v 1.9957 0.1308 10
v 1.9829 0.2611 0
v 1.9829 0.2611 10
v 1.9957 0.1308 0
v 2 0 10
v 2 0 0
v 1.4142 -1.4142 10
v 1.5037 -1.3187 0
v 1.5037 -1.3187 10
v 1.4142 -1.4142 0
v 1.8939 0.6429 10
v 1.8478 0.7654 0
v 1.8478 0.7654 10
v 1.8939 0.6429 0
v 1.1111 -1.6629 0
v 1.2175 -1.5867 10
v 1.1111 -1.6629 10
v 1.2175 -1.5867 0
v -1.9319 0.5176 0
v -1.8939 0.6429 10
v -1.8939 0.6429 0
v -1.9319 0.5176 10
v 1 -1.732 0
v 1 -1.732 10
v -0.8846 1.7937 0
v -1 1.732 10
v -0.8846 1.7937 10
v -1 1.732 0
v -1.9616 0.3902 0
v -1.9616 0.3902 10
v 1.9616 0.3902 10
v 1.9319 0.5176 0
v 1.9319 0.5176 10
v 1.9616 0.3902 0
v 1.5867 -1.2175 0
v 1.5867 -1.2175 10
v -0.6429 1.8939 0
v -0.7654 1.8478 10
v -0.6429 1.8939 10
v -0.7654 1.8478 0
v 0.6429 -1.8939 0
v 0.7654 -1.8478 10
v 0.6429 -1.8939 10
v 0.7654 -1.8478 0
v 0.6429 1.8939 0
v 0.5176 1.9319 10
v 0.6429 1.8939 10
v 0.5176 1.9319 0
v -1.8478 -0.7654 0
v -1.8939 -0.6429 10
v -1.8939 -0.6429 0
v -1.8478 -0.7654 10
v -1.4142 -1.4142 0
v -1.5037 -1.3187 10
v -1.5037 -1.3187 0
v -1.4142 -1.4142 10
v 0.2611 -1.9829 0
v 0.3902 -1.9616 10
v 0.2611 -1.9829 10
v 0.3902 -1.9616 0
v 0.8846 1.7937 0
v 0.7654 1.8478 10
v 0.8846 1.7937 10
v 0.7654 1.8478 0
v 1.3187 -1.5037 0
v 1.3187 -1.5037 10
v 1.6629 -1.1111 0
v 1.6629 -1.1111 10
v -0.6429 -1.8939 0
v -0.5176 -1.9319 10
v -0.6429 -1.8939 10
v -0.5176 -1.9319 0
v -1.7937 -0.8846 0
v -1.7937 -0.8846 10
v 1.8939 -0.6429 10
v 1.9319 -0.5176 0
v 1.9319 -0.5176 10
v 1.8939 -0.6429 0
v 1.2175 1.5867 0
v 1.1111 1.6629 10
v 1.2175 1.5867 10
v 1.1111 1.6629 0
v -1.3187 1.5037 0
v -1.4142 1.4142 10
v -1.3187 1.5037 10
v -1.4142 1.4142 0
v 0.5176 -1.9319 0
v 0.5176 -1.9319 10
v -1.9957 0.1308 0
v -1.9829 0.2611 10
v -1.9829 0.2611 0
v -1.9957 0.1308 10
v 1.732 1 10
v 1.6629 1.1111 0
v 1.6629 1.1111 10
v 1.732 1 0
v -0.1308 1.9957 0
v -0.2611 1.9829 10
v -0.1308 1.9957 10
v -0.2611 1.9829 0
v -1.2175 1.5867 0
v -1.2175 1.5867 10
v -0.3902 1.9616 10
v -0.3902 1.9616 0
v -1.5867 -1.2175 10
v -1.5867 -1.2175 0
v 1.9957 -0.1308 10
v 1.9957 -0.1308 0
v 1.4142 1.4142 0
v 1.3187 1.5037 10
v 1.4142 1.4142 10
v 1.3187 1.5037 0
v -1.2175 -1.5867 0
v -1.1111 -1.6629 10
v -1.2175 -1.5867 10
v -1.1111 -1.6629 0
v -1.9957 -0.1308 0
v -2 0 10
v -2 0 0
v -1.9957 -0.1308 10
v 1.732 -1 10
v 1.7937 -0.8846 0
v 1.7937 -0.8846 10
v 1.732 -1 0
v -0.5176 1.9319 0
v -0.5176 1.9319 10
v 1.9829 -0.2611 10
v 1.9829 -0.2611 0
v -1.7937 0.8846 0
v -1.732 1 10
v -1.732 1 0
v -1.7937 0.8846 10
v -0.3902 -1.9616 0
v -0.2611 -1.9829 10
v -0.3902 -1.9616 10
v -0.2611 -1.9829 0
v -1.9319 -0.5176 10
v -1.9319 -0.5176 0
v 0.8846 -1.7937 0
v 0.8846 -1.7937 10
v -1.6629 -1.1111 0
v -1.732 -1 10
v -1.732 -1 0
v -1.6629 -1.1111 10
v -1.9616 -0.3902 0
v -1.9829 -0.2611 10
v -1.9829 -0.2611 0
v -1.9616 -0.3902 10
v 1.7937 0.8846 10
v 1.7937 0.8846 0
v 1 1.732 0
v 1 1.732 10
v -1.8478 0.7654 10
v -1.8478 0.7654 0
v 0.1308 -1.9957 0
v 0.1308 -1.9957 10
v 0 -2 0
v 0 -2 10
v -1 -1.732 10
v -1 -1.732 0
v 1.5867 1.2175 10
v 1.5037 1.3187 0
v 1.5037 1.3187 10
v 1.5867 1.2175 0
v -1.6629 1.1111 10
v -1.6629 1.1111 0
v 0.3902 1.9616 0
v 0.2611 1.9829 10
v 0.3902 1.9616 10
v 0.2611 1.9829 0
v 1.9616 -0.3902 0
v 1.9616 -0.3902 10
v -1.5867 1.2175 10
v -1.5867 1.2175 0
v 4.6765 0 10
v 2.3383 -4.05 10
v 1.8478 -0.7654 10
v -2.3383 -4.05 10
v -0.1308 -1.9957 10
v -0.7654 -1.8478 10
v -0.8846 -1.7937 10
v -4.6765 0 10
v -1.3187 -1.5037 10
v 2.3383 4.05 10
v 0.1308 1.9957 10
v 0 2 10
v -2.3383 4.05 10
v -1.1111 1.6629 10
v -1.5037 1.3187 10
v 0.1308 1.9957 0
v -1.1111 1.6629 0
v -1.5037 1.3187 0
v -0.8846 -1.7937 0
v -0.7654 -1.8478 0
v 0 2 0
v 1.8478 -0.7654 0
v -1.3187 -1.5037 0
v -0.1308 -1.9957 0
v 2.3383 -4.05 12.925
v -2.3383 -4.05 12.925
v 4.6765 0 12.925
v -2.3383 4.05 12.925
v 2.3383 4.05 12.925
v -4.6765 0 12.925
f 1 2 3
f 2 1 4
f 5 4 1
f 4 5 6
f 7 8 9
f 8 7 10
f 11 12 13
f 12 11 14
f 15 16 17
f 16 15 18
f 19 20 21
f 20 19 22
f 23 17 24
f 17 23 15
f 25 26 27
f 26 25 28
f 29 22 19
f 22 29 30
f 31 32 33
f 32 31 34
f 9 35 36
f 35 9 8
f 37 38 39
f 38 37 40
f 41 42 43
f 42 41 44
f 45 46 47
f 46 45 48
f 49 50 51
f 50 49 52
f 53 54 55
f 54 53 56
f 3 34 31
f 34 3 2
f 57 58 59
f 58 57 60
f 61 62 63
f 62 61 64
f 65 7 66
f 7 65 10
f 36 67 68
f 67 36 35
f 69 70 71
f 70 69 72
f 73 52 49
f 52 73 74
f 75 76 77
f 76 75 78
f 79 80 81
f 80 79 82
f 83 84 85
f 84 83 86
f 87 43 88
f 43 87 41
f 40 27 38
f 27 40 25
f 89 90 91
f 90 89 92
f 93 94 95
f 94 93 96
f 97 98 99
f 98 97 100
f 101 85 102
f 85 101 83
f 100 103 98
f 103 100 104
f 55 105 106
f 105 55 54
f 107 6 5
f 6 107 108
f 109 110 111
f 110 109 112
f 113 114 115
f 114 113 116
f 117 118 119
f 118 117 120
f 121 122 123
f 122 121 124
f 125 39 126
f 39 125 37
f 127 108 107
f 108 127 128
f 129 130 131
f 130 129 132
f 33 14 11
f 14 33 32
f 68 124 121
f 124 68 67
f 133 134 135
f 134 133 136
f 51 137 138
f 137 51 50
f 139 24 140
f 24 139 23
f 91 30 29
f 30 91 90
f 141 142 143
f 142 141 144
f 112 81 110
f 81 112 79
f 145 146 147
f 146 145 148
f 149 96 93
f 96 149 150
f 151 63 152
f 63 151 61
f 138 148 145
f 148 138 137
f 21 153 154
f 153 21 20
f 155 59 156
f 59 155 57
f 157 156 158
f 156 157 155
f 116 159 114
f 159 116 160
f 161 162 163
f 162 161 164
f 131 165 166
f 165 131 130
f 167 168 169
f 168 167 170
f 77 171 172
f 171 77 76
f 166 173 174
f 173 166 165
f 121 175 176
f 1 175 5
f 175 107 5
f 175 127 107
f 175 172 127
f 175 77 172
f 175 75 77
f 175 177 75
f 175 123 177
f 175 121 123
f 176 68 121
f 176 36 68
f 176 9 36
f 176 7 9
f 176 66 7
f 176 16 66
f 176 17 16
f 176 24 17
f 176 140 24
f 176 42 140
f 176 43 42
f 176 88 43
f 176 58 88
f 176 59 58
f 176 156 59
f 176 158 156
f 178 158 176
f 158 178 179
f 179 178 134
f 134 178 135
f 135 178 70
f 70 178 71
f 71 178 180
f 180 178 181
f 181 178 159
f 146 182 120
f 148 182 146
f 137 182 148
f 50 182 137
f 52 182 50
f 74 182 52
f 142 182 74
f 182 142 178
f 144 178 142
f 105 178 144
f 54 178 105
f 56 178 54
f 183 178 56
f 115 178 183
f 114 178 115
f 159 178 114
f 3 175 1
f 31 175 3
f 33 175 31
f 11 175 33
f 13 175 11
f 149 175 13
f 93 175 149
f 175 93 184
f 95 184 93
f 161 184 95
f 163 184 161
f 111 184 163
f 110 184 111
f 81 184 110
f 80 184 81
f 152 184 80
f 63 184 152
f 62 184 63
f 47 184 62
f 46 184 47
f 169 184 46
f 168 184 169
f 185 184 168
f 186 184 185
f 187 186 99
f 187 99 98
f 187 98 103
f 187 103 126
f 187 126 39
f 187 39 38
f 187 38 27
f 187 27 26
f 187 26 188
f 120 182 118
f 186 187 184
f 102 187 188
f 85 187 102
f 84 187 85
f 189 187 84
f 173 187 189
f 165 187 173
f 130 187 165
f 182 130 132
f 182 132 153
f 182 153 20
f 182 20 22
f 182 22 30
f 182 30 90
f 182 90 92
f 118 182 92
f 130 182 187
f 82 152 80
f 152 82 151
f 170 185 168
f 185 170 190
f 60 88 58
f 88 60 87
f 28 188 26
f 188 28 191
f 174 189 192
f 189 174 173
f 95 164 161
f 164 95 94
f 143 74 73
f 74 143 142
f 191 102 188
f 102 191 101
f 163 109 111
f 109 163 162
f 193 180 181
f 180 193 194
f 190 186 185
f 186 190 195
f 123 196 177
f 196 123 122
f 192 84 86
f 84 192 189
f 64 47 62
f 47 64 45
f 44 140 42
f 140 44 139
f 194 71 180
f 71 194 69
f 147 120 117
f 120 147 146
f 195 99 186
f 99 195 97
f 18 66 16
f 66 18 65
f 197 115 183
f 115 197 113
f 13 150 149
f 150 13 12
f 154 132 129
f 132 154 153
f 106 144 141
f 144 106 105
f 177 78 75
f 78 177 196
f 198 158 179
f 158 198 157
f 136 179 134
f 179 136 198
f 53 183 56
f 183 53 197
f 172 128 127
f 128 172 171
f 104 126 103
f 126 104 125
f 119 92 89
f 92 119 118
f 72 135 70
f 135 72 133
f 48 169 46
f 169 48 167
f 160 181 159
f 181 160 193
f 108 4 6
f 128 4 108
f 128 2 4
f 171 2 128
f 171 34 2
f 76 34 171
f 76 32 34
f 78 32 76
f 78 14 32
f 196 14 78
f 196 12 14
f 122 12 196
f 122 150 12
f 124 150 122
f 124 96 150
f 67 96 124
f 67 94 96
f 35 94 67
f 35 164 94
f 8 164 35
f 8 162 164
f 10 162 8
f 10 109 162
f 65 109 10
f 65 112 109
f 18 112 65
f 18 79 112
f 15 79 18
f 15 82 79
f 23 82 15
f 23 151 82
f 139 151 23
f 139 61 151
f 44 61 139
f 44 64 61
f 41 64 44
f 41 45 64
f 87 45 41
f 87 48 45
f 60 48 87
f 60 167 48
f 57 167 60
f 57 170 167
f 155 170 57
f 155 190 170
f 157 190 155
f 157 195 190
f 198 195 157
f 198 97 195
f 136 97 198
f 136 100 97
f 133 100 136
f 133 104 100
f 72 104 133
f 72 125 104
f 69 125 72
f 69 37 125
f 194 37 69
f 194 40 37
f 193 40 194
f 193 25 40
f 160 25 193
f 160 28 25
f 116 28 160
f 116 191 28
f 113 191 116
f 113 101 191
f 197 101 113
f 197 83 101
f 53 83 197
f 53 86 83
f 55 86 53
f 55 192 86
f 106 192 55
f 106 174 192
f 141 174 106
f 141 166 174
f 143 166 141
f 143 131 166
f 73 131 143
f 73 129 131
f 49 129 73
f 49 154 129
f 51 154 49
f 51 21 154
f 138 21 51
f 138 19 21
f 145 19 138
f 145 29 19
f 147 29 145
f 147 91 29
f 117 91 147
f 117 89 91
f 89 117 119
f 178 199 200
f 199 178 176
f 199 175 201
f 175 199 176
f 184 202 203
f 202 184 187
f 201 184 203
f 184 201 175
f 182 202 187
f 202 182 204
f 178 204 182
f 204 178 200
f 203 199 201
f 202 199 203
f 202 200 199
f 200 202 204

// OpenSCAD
$fn = 96;

shaft_d = 4.0;
length = 10.0;

head_flat_d = 8.1;      // across flats
head_h = 2.925;

module hex_prism(af, h) {
    // For a regular hexagon: across-flats = sqrt(3) * circumradius
    r = af / sqrt(3);
    cylinder(h = h, r = r, $fn = 6);
}

union() {
    // Shaft (unthreaded)
    cylinder(h = length, d = shaft_d);

    // Hex head on top
    translate([0, 0, length])
        hex_prism(head_flat_d, head_h);
}
